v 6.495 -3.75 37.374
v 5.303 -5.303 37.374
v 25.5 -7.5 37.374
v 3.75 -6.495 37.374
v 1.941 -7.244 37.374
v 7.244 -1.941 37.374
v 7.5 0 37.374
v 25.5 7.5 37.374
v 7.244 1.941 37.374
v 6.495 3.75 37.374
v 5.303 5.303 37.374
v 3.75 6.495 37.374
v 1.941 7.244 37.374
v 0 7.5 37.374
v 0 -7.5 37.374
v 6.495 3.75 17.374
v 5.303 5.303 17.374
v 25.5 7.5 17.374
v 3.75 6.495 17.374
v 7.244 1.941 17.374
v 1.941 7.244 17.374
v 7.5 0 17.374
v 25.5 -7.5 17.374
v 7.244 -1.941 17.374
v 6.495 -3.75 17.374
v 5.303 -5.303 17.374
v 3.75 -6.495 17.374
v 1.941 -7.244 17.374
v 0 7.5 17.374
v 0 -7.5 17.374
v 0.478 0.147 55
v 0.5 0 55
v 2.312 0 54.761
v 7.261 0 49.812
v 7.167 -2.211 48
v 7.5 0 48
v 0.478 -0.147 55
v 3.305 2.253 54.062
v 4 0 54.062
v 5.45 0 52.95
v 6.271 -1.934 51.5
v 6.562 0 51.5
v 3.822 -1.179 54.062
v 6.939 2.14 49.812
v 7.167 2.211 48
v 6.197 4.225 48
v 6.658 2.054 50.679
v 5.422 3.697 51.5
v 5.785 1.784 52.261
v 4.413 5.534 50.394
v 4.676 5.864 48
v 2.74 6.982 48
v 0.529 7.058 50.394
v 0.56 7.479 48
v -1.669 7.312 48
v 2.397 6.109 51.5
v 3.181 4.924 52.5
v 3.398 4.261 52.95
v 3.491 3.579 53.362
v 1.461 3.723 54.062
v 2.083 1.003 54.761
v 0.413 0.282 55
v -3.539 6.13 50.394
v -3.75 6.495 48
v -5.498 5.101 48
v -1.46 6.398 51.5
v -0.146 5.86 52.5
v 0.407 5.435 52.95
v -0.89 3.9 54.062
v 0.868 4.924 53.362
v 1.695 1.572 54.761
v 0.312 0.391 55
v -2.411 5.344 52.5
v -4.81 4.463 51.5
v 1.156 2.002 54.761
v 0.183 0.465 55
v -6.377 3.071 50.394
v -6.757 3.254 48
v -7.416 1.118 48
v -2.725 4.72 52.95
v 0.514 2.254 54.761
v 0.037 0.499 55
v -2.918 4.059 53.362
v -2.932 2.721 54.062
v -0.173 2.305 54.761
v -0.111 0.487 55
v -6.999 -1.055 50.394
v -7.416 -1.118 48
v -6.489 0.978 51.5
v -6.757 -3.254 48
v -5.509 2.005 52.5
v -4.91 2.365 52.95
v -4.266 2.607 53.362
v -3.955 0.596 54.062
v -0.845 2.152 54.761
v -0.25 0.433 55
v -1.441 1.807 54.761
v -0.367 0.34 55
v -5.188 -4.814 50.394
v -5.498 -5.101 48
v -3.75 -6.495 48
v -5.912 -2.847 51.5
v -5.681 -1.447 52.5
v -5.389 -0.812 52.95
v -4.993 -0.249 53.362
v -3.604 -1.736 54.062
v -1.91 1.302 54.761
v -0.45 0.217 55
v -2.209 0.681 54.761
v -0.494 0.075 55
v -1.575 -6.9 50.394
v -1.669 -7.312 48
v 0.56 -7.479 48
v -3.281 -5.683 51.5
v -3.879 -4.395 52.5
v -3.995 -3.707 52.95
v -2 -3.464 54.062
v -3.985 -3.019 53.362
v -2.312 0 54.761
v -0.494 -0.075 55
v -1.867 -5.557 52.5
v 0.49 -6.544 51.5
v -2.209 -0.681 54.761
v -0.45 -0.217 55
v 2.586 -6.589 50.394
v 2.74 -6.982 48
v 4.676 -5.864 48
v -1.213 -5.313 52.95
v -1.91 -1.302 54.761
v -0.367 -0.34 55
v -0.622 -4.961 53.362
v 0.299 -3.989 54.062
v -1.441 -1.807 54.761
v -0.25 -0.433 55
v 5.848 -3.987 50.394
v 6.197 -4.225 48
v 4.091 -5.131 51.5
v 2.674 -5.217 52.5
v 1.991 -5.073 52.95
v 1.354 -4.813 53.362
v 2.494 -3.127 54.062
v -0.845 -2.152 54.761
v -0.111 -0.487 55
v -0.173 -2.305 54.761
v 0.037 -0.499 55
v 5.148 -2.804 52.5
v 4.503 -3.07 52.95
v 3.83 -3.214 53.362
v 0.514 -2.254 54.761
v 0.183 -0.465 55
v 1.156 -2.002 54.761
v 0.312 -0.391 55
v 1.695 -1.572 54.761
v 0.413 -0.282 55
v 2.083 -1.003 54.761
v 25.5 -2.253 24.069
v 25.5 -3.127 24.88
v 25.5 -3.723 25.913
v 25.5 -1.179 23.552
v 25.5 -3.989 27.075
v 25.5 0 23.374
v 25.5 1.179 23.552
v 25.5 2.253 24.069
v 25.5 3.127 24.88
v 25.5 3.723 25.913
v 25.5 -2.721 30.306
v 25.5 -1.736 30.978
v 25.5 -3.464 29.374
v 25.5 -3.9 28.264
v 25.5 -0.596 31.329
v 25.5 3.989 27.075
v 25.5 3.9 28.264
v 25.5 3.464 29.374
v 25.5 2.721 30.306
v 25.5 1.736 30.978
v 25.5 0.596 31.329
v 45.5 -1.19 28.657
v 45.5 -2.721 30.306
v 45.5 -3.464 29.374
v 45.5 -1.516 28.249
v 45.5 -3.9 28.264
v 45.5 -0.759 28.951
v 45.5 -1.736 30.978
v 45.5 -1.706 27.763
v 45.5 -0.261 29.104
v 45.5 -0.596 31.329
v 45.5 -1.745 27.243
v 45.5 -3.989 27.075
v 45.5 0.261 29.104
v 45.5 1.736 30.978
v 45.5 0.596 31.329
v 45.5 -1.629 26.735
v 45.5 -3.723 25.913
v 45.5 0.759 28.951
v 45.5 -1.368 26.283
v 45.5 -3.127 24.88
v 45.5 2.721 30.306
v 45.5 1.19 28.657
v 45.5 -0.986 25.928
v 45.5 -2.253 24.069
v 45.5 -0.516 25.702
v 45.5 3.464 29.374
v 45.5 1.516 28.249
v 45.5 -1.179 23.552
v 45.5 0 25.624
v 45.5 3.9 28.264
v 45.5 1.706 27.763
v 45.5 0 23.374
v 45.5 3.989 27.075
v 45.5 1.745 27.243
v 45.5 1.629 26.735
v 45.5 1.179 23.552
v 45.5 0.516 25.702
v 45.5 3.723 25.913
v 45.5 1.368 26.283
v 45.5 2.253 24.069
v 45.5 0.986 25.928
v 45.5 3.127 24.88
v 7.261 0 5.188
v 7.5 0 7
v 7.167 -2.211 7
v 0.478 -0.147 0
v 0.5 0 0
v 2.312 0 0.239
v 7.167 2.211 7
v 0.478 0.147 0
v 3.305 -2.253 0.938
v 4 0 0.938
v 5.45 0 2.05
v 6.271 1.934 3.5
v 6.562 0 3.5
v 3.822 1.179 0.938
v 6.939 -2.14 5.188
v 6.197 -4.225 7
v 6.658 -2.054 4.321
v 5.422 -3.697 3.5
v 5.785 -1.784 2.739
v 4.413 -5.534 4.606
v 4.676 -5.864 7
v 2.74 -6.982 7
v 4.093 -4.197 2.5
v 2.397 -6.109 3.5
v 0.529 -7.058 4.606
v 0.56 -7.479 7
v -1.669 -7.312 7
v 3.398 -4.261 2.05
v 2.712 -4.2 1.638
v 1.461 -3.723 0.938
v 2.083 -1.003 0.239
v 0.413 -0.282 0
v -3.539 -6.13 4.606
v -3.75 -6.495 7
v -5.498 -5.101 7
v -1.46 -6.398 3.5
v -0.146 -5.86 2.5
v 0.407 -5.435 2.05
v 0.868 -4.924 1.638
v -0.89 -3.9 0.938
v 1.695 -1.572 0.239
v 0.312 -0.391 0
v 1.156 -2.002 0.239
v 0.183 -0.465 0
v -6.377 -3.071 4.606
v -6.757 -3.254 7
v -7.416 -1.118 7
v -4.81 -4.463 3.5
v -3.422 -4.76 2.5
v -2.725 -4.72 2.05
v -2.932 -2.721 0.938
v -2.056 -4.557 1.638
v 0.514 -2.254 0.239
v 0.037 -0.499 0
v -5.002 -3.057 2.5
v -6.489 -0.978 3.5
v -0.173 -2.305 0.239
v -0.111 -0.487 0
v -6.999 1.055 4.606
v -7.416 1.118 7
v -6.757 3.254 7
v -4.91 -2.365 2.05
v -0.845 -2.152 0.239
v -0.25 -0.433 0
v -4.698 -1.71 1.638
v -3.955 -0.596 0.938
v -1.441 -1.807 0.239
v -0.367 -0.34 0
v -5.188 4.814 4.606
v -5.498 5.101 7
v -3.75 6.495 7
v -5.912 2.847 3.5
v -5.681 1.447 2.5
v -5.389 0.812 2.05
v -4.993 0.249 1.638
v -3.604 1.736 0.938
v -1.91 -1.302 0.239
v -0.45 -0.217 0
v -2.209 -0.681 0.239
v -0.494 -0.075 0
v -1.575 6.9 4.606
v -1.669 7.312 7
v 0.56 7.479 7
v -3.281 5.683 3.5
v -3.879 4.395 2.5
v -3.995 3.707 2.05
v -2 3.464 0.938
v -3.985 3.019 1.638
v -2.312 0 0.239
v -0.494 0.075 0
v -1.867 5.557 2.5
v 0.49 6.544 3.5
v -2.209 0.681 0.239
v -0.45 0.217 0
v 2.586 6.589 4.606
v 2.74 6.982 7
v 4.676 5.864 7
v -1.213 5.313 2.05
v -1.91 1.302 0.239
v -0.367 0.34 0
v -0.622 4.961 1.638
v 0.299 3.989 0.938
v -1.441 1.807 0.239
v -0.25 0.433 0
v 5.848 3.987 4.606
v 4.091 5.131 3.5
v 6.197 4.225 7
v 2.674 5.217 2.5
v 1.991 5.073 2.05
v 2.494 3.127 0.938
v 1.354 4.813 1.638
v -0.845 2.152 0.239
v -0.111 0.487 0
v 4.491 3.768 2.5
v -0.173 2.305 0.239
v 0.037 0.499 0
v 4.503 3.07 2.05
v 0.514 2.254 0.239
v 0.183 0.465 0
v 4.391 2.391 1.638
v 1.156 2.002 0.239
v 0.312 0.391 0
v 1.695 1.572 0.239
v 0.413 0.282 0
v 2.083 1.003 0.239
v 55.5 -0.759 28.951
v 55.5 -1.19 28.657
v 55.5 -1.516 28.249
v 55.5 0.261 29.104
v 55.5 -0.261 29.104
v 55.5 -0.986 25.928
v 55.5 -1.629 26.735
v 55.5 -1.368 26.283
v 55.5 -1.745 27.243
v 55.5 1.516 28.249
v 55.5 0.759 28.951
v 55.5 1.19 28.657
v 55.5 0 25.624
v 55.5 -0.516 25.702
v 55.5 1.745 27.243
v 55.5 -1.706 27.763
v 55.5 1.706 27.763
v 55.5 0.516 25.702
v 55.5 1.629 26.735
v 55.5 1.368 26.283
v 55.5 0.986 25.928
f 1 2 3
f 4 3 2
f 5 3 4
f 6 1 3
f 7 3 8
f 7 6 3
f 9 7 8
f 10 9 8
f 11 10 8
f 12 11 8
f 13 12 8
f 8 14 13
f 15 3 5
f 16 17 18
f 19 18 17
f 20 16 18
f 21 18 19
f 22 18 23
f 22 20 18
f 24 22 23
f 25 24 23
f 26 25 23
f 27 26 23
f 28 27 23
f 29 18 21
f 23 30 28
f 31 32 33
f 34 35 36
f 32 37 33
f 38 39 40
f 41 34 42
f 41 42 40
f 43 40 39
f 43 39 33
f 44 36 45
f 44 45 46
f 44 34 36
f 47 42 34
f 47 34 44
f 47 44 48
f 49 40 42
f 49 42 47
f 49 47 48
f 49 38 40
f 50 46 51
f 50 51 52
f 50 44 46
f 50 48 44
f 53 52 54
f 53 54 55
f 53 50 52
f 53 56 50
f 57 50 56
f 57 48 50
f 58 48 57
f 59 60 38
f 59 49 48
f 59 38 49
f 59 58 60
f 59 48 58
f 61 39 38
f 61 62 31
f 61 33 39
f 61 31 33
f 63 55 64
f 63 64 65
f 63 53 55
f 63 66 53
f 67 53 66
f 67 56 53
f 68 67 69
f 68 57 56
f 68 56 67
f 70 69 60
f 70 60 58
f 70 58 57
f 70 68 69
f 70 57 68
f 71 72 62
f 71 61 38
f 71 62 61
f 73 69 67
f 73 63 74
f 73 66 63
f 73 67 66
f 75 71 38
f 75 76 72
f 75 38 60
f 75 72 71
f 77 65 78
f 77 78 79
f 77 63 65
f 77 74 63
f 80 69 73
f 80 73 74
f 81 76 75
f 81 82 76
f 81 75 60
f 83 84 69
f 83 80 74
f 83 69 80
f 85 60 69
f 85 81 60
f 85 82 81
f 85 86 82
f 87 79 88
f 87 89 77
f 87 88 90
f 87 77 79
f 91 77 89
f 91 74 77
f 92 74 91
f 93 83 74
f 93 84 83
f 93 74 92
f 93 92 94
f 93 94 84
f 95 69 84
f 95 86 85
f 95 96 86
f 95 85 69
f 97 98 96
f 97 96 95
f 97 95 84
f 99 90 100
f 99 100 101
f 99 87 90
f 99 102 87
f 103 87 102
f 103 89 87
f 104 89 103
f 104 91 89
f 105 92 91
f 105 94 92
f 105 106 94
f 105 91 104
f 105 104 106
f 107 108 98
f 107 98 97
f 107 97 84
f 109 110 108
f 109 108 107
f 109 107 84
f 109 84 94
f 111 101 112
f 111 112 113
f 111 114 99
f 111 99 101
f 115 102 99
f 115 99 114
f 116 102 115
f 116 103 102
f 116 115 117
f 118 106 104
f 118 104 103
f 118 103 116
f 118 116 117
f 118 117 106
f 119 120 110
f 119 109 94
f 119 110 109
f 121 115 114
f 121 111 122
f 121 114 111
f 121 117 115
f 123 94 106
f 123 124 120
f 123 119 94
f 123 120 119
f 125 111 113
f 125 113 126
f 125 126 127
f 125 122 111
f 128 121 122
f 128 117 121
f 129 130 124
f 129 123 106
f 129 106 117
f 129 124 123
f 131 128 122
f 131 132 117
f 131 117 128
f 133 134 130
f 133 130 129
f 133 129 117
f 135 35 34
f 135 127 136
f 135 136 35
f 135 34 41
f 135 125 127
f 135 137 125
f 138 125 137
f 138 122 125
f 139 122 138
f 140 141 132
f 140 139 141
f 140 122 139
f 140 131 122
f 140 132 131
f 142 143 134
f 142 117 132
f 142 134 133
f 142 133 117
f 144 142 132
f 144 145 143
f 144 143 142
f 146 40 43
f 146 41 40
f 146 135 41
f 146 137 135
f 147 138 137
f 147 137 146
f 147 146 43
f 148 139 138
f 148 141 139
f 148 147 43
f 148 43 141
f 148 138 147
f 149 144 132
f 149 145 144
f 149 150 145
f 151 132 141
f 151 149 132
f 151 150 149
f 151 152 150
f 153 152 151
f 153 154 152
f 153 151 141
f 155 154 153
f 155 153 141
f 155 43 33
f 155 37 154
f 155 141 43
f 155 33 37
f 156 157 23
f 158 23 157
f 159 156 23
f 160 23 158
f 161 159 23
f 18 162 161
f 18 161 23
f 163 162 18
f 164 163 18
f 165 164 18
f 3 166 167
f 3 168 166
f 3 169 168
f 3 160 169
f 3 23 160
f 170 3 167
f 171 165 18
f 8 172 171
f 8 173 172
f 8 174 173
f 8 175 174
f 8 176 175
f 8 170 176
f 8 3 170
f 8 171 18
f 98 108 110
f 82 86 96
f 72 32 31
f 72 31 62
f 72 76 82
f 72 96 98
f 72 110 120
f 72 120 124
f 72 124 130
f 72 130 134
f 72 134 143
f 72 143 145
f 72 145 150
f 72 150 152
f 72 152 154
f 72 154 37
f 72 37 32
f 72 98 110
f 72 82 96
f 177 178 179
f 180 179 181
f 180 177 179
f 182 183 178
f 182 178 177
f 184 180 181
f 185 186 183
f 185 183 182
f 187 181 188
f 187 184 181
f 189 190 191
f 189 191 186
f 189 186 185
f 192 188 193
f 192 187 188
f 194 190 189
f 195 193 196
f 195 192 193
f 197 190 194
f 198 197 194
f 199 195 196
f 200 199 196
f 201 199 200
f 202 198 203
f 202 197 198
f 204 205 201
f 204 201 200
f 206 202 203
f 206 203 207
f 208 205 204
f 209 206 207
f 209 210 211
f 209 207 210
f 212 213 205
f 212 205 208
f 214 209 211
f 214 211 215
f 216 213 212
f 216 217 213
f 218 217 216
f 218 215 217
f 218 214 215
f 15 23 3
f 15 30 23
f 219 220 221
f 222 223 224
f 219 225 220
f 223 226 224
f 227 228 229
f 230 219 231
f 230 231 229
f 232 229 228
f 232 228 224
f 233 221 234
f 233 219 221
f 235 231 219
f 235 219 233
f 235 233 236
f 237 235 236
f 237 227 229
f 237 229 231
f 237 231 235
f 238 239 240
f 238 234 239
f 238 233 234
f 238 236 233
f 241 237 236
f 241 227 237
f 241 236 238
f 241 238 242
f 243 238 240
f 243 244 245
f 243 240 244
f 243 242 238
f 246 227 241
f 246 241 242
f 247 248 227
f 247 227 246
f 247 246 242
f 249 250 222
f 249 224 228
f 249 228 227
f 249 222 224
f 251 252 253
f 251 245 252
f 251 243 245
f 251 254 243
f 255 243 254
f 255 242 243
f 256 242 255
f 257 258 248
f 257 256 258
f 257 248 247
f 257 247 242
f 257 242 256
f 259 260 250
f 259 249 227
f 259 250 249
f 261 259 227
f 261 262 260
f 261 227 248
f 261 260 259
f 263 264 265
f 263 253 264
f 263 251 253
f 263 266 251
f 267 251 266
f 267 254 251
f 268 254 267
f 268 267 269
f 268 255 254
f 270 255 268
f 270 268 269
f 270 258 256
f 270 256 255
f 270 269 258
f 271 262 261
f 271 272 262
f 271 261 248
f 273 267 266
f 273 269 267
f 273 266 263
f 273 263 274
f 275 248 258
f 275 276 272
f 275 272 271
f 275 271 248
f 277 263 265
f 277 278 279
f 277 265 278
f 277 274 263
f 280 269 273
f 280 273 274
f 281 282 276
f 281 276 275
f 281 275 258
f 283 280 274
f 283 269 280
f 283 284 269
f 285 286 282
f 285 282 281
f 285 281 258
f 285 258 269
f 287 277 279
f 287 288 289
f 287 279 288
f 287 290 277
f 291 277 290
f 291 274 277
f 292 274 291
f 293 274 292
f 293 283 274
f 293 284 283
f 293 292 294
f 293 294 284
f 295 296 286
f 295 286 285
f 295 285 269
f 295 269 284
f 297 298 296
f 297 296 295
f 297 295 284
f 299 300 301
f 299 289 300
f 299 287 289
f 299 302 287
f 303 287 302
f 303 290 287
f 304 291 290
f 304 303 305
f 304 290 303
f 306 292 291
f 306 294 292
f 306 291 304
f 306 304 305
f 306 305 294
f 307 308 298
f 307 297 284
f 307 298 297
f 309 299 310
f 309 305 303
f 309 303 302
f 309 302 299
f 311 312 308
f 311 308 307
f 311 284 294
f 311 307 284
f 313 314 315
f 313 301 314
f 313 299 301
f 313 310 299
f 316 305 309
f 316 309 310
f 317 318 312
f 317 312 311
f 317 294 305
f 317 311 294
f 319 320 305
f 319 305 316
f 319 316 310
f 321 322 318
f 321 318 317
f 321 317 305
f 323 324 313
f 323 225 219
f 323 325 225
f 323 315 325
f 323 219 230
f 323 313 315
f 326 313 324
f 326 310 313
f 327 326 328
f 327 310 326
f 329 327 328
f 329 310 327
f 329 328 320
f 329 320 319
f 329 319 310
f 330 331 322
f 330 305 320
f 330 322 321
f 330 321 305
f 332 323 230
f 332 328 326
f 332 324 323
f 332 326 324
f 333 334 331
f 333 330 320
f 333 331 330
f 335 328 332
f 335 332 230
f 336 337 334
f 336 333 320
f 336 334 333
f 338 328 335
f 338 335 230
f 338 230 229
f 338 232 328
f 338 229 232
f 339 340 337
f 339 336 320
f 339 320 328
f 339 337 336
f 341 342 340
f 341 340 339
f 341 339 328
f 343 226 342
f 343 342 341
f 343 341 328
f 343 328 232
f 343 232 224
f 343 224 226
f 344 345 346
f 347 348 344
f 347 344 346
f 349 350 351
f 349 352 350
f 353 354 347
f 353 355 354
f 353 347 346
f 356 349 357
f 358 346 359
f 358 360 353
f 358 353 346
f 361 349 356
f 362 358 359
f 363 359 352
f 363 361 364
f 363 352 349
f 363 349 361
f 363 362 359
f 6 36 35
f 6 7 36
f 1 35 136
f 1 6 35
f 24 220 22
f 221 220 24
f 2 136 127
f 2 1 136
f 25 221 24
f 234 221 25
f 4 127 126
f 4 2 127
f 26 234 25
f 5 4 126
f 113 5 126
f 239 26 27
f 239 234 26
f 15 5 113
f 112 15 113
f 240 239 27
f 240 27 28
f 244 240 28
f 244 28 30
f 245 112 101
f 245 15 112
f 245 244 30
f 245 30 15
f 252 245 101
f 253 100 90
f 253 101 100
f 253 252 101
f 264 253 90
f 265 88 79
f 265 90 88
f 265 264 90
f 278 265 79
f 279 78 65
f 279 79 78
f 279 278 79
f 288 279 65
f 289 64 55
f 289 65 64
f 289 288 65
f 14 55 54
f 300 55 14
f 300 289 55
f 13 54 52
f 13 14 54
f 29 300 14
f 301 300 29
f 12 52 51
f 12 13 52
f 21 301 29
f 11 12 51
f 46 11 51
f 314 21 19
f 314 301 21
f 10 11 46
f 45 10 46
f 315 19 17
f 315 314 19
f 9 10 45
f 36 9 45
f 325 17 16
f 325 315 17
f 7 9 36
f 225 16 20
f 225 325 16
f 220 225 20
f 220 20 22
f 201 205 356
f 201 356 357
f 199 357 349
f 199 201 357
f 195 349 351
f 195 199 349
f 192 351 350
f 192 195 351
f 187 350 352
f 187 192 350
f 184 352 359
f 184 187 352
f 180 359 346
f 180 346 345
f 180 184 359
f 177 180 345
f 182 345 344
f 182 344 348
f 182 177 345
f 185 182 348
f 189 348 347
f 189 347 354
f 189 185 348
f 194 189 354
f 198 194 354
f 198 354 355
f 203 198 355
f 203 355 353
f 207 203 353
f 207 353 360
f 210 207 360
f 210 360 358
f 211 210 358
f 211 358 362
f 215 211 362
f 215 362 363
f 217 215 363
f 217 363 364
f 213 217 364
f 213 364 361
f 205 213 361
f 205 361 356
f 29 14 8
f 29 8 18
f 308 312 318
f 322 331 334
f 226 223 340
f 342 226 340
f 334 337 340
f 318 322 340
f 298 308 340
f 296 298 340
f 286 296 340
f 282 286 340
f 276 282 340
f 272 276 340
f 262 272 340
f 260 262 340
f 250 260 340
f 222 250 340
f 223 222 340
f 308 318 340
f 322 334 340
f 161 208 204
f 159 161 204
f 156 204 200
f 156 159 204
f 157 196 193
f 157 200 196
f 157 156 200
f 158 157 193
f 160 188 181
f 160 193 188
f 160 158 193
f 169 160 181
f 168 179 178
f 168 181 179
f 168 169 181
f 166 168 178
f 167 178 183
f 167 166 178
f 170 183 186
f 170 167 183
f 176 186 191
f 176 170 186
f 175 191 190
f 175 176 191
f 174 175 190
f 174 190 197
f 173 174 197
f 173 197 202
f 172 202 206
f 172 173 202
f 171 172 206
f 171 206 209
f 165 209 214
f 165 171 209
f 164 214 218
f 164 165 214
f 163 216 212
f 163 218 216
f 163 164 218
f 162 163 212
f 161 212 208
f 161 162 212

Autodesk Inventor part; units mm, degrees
ref_plane "YZ Plane" through (0, 0, 0) normal (1, 0, 0) x (0, 1, 0)
ref_plane "XZ Plane" through (0, 0, 0) normal (0, 1, 0) x (-1, 0, 0)
ref_plane "XY Plane" through (0, 0, 0) normal (0, 0, 1) x (1, 0, 0)
sketch "Sketch1" plane through (0, 0, 0) normal (0, 0, 1) x (1, 0, 0)
  circle A0 centre (0, 0) radius 7.5
  dimension "d0" = 15
extrude "Extrusion1" add sketch "Sketch1" along normal blind 55
fillet "Fillet1" radius 7 1 edges at (-7.5, 0, 55)
fillet "Fillet2" radius 7 1 edges at (-7.5, 0, 0)
sketch "Sketch2" plane through (0, 0, 0) normal (1, 0, 0) x (0, 1, 0)
  line L0 (-7.5, 7) -> (-7.5, 48) projected
  line L1 (-7.5, 37.3739) -> (7.5, 37.3739)
  line L2 (7.5, 37.3739) -> (7.5, 17.3739)
  line L3 (7.5, 17.3739) -> (-7.5, 17.3739)
  line L4 (-7.5, 17.3739) -> (-7.5, 37.3739)
  point P0 (0, 0)
  dimension "d5" = 15
  dimension "d6" = 20
extrude "Extrusion2" add sketch "Sketch2" along normal blind 25.5
sketch "Sketch3" plane through (25.5, 0, 0) normal (1, 0, 0) x (0, 0, -1)
  line L0 (-37.3739, 7.5) -> (-37.3739, -7.5) projected
  line L1 (-37.3739, 0) -> (-27.3739, 0)
  circle A0 centre (-27.3739, 0) radius 1.75
  point P0 (0, 0)
  dimension "d9" = 10
  dimension "d10" = 3.5
extrude "Extrusion3" add sketch "Sketch3" along normal blind 30
sketch "Sketch4" plane through (25.5, 0, 0) normal (1, 0, 0) x (0, 0, -1)
  circle A0 centre (-27.3739, 0) radius 1.75 projected
  circle A1 centre (-27.3739, 0) radius 4
  point P0 (0, 0)
  dimension "d13" = 8
extrude "Extrusion4" add sketch "Sketch4" along normal blind 20
sketch "Sketch5" plane through (0, -7.5, 17.3739) normal (0, -1, 0) x (1, 0, 0)
  point P0 (0, -17.3739)
properties part number "Mic"
